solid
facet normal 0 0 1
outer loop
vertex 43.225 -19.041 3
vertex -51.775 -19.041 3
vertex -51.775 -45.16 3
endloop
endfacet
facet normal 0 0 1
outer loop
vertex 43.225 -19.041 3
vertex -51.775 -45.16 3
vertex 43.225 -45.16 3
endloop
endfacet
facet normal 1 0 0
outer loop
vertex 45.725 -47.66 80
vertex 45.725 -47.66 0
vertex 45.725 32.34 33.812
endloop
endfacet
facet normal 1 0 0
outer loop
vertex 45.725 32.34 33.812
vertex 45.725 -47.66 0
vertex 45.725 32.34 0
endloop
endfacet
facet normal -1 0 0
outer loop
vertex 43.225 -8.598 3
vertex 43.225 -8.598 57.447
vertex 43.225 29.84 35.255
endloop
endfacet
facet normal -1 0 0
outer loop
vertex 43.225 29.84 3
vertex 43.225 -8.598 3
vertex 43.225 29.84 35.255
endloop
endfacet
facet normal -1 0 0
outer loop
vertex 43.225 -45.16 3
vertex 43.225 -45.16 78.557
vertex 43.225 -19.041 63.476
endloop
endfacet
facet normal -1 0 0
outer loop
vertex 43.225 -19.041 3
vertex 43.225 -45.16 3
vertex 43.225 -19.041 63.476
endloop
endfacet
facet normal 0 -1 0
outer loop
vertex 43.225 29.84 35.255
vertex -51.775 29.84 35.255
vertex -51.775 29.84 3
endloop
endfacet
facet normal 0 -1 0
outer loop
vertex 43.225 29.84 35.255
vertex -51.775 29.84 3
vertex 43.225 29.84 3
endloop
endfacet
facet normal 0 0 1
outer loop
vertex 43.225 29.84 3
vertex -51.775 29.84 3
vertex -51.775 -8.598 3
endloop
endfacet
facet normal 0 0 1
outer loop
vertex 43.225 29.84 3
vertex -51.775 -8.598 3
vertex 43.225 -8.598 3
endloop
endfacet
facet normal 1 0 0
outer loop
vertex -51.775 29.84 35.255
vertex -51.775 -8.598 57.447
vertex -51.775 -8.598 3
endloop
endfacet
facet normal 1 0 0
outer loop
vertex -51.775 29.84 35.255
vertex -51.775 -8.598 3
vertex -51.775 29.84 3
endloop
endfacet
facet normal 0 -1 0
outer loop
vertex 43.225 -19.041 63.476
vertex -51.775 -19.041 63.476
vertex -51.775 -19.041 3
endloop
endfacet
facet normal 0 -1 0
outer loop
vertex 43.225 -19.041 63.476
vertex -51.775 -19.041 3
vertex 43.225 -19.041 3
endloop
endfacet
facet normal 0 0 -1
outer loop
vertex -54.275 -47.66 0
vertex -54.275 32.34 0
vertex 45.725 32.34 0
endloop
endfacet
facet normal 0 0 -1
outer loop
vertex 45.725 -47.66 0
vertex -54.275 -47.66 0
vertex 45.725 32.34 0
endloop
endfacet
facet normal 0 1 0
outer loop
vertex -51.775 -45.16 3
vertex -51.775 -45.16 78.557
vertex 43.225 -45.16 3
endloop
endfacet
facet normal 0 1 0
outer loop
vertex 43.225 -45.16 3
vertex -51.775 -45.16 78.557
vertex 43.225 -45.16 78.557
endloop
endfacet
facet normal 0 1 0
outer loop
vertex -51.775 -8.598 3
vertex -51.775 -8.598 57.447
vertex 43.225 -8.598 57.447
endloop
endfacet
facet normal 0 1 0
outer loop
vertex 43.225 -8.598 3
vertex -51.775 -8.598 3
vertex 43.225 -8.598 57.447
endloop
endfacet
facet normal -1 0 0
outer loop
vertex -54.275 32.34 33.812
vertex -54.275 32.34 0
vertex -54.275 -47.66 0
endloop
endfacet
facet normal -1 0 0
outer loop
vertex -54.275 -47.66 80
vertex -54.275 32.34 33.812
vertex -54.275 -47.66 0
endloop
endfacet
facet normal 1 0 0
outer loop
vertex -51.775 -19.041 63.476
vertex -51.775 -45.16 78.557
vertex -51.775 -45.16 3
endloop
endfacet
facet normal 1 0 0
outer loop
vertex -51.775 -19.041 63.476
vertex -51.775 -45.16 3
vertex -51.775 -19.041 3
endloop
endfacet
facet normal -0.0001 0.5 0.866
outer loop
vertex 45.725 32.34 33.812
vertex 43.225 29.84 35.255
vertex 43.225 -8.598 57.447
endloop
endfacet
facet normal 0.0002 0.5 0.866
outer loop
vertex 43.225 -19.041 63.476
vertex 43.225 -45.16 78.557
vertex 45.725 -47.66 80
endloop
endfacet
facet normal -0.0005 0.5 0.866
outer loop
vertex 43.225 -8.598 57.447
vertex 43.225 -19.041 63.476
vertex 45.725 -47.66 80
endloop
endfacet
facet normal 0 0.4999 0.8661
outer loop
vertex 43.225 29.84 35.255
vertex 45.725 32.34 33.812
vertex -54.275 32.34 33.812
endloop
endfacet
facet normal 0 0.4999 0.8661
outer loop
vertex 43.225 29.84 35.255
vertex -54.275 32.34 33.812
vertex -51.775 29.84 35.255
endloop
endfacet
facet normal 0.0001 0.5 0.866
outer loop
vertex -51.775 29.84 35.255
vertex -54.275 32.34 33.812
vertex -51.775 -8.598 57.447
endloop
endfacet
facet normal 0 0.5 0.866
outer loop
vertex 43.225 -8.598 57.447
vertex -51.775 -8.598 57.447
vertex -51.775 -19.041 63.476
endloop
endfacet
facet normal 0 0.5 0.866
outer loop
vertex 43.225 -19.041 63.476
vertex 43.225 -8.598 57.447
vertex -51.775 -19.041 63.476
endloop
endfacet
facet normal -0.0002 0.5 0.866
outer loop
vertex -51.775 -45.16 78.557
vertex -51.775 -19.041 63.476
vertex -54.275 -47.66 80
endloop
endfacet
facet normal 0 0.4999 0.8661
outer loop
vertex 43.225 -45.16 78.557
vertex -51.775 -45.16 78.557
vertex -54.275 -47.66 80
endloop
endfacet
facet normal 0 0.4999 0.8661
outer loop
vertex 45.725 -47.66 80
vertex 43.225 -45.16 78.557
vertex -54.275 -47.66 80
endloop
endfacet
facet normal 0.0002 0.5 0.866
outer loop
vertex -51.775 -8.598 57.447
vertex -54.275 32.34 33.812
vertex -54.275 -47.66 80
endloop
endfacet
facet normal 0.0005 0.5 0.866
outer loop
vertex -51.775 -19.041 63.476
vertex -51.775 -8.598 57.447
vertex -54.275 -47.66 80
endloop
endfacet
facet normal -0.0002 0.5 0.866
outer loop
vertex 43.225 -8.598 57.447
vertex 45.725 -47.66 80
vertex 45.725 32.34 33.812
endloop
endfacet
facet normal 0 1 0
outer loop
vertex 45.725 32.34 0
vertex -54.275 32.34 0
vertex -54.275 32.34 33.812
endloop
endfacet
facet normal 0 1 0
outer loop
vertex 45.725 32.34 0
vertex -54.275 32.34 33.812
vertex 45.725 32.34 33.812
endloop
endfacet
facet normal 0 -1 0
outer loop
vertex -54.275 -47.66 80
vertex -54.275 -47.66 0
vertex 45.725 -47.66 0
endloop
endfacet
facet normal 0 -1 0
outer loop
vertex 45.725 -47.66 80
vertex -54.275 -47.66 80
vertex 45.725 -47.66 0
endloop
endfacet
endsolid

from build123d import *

# Parameters (mm, degrees)
F0_W     = 100
F0_H     = 50
F0_H_2   = 30
F1_DEPTH = 80
F2_W     = 95
F2_H     = 38.437796
F2_H_2   = 26.119551
F3_DEPTH = 77
F5_DEPTH = 250


with BuildPart() as f1:
    # F0 (on Top) → F1 (new body)
    with BuildSketch(Plane.XY):
        with Locations((-4.275286, 7.339517)):
            Rectangle(F0_W, F0_H)
        with Locations((-4.275286, -32.660483)):
            Rectangle(F0_W, F0_H_2)
    extrude(amount=F1_DEPTH)

    # F2 (on face) → F3 (cut)
    with BuildSketch(Plane.XY.offset(80)):
        with Locations((-4.275286, 10.620619)):
            Rectangle(F2_W, F2_H)
        with Locations((-4.275286, -32.100707)):
            Rectangle(F2_W, F2_H_2)
    extrude(amount=-F3_DEPTH, mode=Mode.SUBTRACT)

    # F4 (on face) → F5 (cut)
    with BuildSketch(Plane(origin=(-54.275286, 0, 0), x_dir=(0, -1, 0), z_dir=(-1, 0, 0))):
        Polygon((-32.339517, 33.811978), (47.660483, 80), (-32.339517, 80), align=None)
    extrude(amount=-F5_DEPTH, mode=Mode.SUBTRACT)


solid = f1.part
